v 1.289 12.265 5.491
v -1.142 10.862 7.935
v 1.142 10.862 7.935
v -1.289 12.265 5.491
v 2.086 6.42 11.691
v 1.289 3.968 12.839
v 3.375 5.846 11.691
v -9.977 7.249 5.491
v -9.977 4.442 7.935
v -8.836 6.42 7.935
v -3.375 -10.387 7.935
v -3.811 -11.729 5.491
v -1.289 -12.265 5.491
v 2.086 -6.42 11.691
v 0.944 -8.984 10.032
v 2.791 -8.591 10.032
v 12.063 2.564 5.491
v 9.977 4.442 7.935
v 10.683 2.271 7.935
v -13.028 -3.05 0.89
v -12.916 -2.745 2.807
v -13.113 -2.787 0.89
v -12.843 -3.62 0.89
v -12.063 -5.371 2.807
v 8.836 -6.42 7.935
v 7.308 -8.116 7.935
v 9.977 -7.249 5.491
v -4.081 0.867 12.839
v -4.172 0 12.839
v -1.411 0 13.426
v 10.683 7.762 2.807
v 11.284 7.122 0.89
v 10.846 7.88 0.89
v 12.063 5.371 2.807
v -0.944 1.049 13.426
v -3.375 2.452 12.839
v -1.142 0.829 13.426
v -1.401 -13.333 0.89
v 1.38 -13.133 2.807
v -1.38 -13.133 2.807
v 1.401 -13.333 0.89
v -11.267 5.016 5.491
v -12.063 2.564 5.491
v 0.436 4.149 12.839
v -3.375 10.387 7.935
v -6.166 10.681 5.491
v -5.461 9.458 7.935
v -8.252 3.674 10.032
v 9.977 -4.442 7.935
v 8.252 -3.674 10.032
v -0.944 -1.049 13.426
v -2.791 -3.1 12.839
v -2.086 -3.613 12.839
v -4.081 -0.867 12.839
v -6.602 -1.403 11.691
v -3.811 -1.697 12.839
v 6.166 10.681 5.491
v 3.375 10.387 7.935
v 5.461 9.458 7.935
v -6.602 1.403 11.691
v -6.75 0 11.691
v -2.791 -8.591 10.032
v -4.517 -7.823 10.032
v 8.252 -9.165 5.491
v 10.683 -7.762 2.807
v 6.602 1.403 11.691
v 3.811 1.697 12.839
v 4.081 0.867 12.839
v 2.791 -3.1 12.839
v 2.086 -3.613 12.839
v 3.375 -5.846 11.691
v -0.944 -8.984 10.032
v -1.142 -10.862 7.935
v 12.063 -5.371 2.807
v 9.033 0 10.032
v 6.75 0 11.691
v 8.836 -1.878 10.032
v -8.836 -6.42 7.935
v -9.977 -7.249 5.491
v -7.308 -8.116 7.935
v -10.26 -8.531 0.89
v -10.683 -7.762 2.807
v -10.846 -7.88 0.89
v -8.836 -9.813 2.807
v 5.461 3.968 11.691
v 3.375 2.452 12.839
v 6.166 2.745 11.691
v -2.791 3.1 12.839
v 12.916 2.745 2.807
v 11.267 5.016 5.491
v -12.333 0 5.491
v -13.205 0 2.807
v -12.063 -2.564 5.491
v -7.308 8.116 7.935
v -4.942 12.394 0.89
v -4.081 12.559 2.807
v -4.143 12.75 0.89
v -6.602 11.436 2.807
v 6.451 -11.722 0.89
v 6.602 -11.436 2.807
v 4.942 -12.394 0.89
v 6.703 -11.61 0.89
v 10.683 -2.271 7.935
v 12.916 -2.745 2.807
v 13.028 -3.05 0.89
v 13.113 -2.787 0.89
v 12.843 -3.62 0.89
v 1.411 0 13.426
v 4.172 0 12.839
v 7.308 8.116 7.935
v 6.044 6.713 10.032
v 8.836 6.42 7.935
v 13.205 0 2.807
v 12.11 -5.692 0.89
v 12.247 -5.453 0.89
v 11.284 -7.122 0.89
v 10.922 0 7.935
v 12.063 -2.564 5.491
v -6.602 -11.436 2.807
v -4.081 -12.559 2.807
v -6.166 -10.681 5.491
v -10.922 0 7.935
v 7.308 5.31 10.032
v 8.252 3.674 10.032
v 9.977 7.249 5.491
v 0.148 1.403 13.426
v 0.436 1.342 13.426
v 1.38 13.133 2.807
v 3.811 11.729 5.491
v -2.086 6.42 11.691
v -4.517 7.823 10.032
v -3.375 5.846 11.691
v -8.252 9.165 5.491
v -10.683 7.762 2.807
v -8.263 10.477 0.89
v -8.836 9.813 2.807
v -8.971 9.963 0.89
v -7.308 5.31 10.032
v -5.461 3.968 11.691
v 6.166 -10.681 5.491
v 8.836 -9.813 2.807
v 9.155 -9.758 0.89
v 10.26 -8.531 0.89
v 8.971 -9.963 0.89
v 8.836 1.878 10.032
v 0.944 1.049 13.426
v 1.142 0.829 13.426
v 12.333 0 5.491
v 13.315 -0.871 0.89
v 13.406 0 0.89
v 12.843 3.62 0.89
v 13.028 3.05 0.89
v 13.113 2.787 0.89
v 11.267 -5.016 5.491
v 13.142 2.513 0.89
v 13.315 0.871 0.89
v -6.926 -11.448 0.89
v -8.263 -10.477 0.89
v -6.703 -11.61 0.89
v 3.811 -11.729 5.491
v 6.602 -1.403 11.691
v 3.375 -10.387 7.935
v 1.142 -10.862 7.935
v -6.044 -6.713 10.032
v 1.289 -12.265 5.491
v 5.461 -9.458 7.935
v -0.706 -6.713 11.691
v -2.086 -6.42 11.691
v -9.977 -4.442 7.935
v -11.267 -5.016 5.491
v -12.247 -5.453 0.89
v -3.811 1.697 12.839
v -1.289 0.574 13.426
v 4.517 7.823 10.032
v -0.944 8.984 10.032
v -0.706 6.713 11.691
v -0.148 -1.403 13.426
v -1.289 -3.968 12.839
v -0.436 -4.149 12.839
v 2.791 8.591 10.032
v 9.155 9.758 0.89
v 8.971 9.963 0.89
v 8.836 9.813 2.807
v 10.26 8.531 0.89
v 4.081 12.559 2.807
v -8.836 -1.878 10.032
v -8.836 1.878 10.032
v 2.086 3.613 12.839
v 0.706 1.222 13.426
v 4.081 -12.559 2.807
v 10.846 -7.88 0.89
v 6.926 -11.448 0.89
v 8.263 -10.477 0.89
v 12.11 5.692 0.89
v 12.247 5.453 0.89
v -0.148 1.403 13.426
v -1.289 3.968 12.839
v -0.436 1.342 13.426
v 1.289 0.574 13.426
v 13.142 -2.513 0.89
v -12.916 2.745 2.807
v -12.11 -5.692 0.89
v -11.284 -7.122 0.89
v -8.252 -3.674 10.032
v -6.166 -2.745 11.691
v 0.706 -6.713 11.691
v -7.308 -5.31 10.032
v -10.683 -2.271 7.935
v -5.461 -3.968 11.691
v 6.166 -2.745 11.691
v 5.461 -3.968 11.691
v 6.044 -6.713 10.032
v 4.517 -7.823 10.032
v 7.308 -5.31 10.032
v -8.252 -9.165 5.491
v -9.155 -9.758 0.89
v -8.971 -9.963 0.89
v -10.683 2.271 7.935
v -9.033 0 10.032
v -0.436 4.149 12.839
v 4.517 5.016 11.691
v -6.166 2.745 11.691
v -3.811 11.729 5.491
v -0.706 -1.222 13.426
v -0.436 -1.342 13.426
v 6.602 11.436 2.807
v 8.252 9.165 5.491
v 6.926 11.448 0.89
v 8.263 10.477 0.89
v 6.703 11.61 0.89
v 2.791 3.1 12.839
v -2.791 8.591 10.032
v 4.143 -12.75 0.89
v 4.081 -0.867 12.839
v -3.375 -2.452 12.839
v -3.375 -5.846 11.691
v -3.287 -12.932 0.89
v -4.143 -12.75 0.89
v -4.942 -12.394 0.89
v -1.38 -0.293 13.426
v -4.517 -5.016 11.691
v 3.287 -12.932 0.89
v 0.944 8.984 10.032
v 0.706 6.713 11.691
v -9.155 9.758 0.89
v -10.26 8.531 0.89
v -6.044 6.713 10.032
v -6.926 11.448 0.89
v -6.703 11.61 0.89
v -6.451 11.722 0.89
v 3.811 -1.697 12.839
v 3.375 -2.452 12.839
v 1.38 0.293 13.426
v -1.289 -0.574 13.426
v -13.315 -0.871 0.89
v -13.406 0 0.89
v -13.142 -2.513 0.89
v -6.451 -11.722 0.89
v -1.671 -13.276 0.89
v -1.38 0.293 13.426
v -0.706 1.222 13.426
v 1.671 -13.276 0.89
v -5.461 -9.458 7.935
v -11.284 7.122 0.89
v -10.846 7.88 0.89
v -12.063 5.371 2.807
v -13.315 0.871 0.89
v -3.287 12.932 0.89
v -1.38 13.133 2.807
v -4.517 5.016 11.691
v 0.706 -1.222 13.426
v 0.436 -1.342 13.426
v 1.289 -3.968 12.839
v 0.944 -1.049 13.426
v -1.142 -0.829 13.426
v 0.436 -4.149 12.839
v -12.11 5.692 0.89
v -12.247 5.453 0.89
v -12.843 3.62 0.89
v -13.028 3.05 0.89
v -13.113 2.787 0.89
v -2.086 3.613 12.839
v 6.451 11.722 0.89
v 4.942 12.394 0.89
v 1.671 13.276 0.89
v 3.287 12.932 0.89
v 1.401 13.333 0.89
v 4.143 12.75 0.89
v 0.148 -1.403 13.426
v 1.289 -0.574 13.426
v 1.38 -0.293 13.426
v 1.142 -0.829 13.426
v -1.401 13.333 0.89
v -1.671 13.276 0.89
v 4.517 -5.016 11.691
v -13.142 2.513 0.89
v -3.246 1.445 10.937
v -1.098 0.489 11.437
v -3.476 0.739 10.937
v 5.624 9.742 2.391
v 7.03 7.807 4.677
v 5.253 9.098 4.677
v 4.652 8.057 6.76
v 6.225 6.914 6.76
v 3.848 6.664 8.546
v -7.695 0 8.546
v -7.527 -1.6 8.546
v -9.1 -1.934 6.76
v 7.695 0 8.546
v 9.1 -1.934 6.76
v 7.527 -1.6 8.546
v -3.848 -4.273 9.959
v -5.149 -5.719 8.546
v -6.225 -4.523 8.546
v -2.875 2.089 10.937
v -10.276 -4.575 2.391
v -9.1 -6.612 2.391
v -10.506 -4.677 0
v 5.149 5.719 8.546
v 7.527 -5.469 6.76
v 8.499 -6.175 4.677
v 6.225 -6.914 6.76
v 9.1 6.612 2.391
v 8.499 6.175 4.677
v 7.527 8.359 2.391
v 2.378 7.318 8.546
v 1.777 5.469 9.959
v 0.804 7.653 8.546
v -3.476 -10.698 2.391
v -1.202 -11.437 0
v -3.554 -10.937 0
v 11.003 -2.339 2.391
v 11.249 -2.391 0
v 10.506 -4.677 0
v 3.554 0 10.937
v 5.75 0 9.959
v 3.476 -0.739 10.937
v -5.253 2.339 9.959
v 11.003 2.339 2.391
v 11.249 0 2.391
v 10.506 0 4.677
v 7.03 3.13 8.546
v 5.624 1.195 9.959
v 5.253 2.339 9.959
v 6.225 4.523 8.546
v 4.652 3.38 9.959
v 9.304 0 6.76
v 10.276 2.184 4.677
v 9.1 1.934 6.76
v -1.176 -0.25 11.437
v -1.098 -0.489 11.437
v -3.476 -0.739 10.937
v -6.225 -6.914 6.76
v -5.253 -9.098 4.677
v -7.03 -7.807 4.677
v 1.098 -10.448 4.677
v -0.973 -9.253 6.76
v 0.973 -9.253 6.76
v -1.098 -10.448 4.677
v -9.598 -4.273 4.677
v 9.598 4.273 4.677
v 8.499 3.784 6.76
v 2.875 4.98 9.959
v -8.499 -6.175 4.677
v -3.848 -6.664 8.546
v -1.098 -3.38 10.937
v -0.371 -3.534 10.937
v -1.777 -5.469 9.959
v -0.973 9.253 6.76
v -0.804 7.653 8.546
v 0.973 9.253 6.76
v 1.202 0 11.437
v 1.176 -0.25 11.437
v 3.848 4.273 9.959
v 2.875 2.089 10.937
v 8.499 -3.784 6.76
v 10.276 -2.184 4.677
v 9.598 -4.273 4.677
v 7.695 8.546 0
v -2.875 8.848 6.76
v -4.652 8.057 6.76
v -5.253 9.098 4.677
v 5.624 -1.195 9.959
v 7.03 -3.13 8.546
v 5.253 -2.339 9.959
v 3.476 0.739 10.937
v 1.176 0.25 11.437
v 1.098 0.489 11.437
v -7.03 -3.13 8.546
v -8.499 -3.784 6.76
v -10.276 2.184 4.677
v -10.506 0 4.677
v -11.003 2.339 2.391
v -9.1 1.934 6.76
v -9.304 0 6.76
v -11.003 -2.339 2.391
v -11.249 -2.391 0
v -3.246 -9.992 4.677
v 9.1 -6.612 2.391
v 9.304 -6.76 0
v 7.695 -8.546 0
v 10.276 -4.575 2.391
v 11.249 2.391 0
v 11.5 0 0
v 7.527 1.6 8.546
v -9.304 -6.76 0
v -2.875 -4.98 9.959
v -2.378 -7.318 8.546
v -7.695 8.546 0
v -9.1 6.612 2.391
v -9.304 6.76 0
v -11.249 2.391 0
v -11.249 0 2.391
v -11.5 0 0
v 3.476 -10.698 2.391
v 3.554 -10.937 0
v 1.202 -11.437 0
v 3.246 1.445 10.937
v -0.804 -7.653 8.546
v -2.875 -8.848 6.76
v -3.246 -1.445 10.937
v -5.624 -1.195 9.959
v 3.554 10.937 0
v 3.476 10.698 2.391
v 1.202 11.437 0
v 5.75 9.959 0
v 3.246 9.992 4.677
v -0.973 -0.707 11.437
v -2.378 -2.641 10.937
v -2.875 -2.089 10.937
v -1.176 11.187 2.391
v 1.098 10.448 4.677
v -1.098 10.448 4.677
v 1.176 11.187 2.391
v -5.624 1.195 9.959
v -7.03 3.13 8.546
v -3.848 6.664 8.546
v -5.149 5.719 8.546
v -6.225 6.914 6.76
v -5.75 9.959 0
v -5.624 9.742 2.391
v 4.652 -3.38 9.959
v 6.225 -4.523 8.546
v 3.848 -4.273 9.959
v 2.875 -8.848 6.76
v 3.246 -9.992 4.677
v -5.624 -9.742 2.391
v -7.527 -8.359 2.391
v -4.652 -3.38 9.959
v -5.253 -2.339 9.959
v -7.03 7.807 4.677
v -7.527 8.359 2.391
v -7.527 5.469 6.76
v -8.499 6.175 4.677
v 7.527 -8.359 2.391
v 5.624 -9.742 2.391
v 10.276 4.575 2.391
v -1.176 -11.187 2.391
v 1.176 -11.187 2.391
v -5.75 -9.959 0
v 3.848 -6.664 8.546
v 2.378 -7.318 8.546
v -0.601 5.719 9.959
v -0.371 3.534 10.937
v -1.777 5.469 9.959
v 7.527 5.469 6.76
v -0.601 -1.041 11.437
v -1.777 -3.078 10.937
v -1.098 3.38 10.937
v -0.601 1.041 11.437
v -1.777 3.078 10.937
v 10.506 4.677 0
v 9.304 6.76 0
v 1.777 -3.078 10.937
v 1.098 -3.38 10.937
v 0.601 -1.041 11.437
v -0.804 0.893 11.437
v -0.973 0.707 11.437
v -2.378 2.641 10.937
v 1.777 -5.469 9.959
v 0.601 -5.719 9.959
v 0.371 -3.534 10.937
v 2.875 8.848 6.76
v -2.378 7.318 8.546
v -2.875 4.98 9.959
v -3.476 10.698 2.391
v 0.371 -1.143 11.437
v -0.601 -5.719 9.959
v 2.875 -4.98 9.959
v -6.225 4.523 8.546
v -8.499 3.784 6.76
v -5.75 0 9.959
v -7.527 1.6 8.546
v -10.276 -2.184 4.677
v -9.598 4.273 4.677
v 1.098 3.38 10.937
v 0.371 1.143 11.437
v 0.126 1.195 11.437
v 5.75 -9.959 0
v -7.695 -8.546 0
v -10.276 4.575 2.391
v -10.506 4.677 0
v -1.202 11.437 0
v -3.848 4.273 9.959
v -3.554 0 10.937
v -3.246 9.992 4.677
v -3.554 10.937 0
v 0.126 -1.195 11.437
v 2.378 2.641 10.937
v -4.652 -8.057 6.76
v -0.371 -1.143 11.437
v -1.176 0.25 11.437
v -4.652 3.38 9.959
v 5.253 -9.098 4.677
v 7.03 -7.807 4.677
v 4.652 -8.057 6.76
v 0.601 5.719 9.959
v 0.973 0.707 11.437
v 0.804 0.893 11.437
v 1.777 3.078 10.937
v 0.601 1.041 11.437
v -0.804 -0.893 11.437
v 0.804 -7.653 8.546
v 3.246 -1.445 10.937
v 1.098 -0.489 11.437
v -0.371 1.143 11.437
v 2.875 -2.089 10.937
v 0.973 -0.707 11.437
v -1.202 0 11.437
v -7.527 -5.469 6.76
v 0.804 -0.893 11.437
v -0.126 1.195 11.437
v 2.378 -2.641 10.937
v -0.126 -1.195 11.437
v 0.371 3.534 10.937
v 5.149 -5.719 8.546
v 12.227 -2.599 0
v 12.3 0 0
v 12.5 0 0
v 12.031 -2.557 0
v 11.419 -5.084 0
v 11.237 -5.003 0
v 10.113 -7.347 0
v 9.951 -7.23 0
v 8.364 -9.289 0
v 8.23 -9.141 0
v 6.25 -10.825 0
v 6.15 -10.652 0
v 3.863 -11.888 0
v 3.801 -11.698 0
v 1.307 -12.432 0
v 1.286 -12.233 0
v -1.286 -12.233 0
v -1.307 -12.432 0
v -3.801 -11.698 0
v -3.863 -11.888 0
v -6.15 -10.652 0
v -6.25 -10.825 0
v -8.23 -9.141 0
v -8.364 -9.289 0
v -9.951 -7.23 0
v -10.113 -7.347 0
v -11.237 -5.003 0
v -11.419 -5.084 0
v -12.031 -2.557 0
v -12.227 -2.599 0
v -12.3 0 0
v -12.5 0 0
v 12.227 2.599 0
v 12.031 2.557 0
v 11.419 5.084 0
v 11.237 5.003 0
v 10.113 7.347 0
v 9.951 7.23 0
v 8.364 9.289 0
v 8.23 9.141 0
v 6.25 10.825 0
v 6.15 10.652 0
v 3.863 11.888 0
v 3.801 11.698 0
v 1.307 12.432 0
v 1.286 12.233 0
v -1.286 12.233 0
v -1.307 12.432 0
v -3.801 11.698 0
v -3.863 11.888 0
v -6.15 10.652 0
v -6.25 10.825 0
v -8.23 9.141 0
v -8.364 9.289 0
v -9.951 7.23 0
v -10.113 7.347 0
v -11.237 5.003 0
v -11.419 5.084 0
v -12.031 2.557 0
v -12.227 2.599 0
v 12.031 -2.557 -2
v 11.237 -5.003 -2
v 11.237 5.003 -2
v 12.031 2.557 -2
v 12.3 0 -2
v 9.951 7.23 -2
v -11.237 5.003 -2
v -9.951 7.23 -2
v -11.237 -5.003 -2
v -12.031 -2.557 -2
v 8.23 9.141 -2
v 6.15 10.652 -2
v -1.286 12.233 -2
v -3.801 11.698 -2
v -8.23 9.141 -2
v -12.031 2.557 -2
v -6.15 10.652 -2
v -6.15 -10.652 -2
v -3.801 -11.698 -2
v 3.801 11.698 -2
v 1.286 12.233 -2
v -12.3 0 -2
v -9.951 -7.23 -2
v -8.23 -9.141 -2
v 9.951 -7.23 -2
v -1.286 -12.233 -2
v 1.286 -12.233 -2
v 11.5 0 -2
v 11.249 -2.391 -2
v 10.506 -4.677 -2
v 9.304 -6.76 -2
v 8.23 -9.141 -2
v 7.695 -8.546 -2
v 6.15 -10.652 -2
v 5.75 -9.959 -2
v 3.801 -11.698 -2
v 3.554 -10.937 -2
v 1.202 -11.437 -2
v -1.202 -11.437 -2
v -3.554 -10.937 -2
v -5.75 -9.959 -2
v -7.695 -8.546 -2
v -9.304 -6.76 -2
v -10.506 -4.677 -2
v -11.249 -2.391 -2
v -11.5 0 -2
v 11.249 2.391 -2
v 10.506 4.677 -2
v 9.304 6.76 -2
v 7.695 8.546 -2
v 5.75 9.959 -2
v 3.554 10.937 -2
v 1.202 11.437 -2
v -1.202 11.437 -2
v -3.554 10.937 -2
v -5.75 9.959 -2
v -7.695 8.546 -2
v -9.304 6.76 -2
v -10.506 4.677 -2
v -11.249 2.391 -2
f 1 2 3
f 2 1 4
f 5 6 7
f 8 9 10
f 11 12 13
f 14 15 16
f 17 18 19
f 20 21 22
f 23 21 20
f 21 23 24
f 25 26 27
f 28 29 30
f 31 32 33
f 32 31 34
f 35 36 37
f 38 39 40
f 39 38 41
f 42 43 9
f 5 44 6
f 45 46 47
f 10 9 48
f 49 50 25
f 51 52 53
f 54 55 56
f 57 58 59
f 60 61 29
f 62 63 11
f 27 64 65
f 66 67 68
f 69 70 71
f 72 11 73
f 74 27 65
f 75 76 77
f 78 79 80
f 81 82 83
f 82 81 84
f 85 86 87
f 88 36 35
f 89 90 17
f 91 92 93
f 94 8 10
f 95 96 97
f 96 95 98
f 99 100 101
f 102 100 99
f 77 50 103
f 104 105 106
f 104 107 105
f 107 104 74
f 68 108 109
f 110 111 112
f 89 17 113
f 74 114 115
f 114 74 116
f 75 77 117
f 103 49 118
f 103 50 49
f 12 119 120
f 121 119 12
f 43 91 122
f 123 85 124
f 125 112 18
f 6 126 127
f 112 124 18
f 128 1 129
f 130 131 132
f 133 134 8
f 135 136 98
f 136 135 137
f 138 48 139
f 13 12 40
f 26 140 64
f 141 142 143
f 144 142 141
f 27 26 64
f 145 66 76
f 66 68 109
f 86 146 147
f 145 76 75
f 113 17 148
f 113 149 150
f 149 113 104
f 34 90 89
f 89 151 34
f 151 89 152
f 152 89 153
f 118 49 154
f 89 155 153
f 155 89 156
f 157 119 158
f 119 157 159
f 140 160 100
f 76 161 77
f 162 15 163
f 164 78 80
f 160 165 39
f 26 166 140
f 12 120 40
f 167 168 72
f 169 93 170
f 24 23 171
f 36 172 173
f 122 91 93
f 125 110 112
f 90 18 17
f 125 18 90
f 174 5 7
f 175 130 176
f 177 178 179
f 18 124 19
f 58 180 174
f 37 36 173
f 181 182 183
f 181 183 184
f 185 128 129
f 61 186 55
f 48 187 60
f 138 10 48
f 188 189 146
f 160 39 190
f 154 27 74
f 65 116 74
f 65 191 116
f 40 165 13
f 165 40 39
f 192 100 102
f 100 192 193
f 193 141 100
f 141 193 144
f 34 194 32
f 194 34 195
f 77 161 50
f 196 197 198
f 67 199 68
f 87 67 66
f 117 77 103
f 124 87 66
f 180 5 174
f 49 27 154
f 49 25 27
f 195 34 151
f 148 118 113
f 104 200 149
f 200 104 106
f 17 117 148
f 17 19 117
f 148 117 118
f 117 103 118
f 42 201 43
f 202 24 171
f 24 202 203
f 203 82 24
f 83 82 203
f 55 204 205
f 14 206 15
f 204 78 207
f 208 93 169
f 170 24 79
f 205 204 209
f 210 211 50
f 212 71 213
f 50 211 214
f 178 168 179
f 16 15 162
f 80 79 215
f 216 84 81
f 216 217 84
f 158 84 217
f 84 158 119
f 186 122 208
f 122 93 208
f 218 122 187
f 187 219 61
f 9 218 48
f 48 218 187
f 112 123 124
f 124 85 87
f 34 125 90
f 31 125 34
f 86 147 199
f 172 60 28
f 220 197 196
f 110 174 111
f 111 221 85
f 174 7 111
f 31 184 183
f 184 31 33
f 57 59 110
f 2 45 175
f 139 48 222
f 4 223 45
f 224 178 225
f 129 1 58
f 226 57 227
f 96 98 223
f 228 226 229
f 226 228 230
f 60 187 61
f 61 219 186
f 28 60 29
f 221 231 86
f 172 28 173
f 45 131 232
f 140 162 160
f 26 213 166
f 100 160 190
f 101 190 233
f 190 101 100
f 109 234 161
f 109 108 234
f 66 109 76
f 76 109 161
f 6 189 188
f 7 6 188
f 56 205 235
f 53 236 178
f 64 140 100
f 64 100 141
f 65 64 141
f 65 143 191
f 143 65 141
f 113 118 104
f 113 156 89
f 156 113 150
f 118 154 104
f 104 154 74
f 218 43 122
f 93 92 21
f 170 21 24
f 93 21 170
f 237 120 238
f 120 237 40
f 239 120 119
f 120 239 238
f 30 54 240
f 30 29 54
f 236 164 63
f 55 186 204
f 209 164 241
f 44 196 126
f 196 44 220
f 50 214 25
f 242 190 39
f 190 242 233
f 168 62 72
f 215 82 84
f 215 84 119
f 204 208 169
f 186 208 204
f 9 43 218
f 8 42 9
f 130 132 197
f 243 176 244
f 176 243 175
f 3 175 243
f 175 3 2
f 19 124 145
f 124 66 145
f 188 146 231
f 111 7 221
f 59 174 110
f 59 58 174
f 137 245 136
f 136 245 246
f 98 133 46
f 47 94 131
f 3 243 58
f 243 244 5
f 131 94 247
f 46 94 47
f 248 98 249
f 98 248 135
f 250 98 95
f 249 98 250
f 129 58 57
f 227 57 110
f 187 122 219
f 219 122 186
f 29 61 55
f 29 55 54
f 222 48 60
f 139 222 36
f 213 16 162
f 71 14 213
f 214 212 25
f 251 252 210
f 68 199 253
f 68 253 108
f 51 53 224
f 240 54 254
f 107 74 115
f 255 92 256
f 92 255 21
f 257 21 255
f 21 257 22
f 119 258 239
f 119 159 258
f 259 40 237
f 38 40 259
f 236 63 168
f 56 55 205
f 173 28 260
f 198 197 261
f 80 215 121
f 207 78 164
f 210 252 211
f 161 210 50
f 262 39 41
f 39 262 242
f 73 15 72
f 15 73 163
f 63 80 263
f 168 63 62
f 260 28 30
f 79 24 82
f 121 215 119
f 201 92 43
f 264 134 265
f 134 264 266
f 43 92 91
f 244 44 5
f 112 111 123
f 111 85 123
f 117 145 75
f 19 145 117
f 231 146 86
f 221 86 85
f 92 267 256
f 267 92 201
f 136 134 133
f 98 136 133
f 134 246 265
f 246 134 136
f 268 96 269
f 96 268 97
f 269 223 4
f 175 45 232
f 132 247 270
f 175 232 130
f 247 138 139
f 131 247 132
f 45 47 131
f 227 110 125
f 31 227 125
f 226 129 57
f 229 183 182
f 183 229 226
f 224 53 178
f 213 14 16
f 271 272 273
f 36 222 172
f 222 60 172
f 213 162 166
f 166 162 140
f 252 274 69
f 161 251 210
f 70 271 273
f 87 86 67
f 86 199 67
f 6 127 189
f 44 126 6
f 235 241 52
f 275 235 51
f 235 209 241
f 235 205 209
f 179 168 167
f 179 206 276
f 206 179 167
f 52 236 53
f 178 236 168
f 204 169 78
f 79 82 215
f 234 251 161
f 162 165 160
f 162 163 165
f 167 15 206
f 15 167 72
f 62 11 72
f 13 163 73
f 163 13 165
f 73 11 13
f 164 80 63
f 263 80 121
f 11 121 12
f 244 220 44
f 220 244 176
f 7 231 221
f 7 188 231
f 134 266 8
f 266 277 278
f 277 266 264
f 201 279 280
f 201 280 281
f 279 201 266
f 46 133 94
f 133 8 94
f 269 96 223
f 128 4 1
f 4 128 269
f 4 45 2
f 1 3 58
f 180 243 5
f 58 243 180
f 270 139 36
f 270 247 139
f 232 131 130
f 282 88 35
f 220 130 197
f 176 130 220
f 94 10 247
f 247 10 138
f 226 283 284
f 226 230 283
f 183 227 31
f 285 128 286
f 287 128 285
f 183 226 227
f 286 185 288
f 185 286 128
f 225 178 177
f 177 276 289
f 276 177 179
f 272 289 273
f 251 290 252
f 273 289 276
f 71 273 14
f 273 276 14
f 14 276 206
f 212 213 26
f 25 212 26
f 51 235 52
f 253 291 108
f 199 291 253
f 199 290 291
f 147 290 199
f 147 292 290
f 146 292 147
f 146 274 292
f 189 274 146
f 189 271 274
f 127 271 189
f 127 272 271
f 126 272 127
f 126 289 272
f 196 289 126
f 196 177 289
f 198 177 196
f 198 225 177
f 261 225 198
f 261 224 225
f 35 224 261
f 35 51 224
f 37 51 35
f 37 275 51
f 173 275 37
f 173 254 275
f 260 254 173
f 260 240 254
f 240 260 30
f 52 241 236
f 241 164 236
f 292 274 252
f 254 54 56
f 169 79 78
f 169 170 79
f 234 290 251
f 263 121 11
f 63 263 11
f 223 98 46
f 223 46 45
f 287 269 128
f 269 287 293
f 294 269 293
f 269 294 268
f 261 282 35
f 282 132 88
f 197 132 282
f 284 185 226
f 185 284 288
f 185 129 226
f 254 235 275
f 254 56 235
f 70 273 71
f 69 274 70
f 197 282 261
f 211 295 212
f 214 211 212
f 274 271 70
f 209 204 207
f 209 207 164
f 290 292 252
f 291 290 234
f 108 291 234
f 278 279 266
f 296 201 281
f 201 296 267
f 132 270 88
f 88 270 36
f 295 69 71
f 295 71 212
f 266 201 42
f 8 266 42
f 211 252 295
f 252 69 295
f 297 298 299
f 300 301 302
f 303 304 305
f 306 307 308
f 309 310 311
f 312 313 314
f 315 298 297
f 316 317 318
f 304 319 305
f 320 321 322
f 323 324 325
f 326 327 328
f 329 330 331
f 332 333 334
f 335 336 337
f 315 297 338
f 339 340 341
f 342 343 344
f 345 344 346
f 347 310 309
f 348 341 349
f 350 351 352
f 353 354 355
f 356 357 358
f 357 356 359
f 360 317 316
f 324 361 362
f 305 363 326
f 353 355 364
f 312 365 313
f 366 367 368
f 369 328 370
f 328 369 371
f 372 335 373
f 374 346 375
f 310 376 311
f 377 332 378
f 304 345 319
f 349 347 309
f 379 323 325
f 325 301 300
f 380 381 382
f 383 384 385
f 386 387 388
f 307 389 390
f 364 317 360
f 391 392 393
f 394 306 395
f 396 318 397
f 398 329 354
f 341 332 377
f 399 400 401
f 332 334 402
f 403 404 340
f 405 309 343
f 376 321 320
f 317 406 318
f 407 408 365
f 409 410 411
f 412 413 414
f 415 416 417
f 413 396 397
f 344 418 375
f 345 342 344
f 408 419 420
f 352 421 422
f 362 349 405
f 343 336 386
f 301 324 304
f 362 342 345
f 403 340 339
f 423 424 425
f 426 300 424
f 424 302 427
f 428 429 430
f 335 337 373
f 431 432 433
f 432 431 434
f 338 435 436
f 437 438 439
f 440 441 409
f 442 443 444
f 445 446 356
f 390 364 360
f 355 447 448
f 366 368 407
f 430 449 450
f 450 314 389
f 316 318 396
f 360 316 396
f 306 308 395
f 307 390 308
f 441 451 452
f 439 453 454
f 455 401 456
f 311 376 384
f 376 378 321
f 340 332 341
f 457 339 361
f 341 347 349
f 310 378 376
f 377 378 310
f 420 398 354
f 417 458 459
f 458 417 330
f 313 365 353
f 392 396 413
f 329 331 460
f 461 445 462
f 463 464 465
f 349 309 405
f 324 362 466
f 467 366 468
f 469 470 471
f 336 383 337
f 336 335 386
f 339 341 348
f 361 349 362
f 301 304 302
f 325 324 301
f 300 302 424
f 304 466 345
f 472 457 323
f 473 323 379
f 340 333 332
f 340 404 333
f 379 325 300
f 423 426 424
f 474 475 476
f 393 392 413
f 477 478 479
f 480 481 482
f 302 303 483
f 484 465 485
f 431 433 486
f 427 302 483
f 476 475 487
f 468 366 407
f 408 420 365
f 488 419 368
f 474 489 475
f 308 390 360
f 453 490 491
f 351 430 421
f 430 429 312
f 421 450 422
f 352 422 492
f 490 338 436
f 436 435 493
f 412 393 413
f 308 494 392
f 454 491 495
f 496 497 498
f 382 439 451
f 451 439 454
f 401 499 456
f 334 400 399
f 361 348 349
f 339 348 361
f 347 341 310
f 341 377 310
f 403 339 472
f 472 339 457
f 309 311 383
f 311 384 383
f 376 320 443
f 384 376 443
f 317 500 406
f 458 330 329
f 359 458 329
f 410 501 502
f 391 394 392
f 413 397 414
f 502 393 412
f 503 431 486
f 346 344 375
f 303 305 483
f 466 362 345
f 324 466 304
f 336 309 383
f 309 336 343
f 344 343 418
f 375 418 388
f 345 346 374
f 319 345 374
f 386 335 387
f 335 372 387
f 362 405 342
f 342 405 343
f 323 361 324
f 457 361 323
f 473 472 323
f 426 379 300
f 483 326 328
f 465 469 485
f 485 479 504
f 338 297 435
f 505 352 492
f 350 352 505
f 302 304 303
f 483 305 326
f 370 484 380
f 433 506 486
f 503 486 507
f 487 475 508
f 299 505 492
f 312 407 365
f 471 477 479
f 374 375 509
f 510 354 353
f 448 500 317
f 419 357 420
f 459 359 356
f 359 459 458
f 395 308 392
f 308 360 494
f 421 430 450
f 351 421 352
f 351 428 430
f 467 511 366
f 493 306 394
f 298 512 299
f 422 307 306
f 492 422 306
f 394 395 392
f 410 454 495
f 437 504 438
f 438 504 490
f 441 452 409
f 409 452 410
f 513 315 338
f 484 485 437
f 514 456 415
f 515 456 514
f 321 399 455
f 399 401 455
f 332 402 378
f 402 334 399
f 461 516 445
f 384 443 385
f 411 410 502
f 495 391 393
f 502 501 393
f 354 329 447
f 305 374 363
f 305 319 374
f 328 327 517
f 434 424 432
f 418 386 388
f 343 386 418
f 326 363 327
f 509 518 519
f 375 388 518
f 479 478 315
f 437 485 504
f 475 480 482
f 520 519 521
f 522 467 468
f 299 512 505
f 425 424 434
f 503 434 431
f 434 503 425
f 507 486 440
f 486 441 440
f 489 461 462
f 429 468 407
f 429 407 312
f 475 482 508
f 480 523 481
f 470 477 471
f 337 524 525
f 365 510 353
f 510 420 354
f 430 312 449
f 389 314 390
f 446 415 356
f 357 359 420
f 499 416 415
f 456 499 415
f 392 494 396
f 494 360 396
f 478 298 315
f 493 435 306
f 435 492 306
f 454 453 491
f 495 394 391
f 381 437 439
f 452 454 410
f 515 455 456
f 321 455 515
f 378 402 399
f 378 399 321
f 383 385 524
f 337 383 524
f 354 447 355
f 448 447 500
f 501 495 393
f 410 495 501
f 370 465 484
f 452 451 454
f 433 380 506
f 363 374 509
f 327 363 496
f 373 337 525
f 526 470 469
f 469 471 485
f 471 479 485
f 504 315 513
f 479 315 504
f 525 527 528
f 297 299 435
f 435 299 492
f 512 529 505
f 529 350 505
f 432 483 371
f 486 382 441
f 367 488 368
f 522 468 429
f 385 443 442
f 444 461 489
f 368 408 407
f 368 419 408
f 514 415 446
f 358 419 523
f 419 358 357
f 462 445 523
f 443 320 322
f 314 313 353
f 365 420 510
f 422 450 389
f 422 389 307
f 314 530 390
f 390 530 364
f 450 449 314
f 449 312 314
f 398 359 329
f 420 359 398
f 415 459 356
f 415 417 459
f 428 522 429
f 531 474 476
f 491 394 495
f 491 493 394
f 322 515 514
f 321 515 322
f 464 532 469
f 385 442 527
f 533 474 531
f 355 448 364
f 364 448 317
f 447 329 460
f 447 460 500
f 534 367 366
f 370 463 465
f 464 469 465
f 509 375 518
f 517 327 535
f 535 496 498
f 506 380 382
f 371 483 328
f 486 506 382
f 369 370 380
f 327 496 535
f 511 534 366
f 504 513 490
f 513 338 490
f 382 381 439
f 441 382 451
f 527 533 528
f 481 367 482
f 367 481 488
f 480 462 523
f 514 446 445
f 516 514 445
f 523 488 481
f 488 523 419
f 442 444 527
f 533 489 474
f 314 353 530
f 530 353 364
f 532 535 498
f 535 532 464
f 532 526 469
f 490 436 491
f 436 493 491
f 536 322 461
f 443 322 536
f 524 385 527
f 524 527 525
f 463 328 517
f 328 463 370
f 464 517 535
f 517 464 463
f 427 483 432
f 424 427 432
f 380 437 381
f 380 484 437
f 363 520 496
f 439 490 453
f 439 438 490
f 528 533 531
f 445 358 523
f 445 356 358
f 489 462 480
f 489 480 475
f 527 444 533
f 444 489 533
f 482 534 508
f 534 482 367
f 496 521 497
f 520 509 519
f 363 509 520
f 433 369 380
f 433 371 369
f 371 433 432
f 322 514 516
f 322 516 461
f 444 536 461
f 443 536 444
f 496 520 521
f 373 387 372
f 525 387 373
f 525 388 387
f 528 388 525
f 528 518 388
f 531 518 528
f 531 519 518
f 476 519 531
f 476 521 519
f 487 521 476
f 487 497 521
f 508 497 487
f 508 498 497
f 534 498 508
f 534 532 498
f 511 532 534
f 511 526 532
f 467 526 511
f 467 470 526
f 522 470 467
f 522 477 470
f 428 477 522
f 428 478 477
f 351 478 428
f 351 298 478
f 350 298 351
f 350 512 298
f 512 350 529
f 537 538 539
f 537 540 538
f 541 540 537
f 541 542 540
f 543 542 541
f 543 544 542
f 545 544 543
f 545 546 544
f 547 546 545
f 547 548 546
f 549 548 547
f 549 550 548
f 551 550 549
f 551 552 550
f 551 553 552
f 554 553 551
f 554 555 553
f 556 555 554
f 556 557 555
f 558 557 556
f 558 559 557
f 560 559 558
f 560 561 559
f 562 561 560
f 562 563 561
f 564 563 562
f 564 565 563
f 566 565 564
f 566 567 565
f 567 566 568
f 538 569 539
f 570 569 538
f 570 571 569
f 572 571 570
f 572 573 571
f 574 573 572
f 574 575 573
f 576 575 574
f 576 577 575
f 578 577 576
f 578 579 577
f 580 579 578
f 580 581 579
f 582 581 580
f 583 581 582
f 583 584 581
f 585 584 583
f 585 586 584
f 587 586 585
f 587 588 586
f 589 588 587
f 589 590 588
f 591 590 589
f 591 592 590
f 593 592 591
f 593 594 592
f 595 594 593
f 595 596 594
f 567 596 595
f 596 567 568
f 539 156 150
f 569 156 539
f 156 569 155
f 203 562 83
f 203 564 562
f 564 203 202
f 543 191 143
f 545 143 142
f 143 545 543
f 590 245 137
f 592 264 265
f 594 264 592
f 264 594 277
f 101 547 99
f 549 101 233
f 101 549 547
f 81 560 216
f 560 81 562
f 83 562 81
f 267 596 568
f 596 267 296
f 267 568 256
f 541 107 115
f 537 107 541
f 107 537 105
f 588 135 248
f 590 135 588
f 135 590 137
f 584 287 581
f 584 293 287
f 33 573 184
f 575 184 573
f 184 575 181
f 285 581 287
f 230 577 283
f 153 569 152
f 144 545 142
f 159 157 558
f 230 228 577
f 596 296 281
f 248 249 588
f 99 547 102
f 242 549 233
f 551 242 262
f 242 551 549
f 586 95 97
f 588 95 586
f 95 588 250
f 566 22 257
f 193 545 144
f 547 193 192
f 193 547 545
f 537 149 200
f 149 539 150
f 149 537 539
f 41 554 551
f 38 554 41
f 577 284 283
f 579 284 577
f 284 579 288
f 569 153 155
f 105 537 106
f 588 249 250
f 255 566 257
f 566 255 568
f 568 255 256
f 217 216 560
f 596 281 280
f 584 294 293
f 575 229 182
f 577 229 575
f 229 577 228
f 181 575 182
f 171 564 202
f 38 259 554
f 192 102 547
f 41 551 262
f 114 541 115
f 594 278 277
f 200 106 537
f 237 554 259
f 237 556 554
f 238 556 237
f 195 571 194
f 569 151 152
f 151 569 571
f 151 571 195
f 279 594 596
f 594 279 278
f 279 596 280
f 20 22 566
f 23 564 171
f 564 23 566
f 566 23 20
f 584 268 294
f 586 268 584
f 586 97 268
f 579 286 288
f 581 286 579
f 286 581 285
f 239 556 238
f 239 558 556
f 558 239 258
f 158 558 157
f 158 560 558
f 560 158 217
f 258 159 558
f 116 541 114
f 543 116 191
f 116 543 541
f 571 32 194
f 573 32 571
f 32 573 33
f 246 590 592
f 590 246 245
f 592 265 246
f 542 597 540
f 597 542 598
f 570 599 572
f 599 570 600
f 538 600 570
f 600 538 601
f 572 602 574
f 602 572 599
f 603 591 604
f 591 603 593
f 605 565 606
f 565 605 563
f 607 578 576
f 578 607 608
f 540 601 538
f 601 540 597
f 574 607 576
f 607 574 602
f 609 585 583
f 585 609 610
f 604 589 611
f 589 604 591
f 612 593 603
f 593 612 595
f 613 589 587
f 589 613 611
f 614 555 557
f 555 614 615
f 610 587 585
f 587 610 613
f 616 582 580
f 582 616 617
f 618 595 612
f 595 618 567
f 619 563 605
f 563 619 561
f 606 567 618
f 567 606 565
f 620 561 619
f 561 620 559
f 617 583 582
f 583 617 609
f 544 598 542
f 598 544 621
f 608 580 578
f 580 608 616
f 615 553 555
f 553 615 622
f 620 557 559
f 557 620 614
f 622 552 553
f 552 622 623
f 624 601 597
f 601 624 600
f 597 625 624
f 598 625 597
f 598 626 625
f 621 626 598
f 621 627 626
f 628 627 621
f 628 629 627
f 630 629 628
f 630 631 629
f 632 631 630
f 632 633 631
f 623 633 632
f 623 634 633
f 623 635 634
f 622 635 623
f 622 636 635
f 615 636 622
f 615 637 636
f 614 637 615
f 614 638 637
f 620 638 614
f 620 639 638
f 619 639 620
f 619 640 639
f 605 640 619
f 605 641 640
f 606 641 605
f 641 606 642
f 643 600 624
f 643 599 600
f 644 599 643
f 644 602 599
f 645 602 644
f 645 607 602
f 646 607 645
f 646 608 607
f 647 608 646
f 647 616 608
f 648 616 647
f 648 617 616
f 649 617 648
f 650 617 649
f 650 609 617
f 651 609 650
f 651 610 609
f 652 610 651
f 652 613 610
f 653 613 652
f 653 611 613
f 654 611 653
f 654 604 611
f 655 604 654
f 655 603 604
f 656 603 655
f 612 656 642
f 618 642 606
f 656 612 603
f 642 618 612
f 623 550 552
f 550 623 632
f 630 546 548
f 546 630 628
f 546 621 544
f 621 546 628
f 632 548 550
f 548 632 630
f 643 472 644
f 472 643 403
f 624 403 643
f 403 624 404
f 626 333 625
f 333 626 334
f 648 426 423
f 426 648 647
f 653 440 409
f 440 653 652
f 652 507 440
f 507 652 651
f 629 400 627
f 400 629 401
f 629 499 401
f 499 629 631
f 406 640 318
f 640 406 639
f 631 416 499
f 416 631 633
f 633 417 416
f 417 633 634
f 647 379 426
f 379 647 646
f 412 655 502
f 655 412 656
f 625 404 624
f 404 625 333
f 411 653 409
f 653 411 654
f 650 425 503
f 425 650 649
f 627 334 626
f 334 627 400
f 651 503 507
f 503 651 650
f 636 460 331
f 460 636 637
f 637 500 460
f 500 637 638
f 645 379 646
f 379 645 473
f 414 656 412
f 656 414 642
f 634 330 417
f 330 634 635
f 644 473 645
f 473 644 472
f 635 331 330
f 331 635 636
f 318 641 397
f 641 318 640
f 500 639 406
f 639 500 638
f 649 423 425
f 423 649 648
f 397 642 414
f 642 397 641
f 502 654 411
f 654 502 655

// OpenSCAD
thick = 2;
clear = 0.2;

size = 27;

capsule_bottom();

module capsule_top(){
    intersection(){
        translate([0,0,size/2])cube([size,size,size], true);
        difference(){
            sphere(size/2);
            sphere(size/2-thick);
            cylinder(2,size/2-thick/2,size/2-thick/2);
            #translate([0,0,2])
            cylinder(3,size/2-thick/2,size/2-thick*2);
        }
    }
}

module capsule_bottom(){
    intersection(){
        translate([0,0,size/2])cube([size,size,size], true);
        difference(){
            sphere(size/2);
            sphere(size/2-thick);
        }
        cylinder(size,size/2-thick/2,40);
    }
    difference(){
        #translate([0,0,-2])
            cylinder(3-clear,size/2-thick/2-clear,size/2-thick/2-clear);
        translate([0,0,-2])
            cylinder(3,size/2-thick,size/2-thick);
    }
}
